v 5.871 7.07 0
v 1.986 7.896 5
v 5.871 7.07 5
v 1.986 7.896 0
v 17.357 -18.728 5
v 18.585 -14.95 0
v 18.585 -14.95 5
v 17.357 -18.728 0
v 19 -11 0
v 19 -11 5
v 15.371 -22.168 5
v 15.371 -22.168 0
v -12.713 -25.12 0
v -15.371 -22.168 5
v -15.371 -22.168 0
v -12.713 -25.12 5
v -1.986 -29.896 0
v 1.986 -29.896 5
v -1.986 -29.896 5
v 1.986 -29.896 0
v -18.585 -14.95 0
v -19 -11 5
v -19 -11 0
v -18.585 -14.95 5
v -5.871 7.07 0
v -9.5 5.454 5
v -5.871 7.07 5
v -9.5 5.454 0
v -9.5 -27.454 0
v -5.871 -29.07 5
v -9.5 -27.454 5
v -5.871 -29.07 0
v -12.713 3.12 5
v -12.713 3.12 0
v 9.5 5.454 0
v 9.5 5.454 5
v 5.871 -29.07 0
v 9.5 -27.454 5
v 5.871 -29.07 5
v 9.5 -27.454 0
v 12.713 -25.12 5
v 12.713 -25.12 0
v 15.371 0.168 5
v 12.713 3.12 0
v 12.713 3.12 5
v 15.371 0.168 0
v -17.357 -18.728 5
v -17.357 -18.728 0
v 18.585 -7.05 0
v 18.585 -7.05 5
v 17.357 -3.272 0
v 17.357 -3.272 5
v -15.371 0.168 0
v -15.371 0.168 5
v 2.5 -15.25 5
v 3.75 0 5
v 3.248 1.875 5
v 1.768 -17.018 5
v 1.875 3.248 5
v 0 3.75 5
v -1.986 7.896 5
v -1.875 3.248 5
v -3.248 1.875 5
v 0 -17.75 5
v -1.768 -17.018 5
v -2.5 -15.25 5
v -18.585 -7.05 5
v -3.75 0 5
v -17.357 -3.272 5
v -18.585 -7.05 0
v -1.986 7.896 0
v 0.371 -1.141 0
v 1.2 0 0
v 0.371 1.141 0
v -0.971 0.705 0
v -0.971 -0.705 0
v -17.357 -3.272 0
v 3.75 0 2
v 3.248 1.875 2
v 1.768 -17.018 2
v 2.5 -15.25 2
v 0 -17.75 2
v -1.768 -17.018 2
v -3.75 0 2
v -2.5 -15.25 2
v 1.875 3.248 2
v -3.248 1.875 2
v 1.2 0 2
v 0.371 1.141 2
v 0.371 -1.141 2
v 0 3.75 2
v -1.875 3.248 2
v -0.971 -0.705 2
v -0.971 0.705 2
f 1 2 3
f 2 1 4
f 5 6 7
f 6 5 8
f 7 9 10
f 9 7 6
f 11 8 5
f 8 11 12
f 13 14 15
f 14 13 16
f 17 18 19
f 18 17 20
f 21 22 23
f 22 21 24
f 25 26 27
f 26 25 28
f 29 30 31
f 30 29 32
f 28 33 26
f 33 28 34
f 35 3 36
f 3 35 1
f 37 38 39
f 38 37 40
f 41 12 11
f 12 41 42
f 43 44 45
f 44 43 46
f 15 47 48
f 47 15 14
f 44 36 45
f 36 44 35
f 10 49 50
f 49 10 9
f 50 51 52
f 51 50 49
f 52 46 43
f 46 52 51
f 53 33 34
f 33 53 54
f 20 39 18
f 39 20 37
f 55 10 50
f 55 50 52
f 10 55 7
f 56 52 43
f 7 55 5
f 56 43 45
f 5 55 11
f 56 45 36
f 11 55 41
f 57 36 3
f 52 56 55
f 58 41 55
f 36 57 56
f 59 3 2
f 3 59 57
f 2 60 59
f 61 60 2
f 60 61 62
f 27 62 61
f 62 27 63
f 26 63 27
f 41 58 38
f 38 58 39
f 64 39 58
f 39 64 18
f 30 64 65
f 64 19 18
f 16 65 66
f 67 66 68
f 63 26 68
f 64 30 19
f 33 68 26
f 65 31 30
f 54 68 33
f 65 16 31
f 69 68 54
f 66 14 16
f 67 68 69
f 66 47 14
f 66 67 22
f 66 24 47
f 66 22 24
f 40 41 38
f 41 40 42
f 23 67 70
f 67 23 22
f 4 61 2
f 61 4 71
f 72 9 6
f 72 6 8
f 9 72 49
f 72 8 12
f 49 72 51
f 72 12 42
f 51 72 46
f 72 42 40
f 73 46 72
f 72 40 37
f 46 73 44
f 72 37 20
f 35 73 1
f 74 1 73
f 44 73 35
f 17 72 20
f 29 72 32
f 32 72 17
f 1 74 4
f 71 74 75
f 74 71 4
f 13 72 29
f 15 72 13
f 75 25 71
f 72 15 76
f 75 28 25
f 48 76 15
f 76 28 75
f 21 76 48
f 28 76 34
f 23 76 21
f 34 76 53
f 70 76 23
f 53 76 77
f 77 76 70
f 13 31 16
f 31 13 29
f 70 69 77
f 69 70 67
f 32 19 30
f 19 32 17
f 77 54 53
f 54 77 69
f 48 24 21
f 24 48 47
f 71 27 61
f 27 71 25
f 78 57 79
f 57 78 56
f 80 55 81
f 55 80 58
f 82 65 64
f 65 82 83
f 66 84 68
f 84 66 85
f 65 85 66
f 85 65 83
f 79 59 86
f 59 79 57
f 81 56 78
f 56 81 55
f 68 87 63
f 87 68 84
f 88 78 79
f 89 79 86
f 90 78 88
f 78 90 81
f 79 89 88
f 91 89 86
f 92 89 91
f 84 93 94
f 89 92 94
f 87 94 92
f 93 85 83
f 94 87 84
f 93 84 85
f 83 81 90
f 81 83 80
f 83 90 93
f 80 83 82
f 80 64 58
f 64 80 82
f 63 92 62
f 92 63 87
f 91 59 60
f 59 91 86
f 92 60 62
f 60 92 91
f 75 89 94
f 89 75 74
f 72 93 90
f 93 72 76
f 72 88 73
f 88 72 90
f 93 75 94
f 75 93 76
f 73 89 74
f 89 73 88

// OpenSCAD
translate(v = [0, 0, 5.0]) {
	rotate(a = [180, 0, 0]) {
		difference() {
			translate(v = [0, 11.0, 0]) {
				cylinder(d = 38.0, h = 5.0);
			}
			translate(v = [0, 0, -0.1]) {
				hull() {
					cylinder(d = 7.5, h = 3.1);
					translate(v = [0, 15.25, 0]) {
						cylinder(d = 5.0, h = 3.1);
					}
				}
			}
			translate(v = [0, 0, -1]) {
				cylinder(d = 2.4, h = 7.0);
			}
		}
	}
}
